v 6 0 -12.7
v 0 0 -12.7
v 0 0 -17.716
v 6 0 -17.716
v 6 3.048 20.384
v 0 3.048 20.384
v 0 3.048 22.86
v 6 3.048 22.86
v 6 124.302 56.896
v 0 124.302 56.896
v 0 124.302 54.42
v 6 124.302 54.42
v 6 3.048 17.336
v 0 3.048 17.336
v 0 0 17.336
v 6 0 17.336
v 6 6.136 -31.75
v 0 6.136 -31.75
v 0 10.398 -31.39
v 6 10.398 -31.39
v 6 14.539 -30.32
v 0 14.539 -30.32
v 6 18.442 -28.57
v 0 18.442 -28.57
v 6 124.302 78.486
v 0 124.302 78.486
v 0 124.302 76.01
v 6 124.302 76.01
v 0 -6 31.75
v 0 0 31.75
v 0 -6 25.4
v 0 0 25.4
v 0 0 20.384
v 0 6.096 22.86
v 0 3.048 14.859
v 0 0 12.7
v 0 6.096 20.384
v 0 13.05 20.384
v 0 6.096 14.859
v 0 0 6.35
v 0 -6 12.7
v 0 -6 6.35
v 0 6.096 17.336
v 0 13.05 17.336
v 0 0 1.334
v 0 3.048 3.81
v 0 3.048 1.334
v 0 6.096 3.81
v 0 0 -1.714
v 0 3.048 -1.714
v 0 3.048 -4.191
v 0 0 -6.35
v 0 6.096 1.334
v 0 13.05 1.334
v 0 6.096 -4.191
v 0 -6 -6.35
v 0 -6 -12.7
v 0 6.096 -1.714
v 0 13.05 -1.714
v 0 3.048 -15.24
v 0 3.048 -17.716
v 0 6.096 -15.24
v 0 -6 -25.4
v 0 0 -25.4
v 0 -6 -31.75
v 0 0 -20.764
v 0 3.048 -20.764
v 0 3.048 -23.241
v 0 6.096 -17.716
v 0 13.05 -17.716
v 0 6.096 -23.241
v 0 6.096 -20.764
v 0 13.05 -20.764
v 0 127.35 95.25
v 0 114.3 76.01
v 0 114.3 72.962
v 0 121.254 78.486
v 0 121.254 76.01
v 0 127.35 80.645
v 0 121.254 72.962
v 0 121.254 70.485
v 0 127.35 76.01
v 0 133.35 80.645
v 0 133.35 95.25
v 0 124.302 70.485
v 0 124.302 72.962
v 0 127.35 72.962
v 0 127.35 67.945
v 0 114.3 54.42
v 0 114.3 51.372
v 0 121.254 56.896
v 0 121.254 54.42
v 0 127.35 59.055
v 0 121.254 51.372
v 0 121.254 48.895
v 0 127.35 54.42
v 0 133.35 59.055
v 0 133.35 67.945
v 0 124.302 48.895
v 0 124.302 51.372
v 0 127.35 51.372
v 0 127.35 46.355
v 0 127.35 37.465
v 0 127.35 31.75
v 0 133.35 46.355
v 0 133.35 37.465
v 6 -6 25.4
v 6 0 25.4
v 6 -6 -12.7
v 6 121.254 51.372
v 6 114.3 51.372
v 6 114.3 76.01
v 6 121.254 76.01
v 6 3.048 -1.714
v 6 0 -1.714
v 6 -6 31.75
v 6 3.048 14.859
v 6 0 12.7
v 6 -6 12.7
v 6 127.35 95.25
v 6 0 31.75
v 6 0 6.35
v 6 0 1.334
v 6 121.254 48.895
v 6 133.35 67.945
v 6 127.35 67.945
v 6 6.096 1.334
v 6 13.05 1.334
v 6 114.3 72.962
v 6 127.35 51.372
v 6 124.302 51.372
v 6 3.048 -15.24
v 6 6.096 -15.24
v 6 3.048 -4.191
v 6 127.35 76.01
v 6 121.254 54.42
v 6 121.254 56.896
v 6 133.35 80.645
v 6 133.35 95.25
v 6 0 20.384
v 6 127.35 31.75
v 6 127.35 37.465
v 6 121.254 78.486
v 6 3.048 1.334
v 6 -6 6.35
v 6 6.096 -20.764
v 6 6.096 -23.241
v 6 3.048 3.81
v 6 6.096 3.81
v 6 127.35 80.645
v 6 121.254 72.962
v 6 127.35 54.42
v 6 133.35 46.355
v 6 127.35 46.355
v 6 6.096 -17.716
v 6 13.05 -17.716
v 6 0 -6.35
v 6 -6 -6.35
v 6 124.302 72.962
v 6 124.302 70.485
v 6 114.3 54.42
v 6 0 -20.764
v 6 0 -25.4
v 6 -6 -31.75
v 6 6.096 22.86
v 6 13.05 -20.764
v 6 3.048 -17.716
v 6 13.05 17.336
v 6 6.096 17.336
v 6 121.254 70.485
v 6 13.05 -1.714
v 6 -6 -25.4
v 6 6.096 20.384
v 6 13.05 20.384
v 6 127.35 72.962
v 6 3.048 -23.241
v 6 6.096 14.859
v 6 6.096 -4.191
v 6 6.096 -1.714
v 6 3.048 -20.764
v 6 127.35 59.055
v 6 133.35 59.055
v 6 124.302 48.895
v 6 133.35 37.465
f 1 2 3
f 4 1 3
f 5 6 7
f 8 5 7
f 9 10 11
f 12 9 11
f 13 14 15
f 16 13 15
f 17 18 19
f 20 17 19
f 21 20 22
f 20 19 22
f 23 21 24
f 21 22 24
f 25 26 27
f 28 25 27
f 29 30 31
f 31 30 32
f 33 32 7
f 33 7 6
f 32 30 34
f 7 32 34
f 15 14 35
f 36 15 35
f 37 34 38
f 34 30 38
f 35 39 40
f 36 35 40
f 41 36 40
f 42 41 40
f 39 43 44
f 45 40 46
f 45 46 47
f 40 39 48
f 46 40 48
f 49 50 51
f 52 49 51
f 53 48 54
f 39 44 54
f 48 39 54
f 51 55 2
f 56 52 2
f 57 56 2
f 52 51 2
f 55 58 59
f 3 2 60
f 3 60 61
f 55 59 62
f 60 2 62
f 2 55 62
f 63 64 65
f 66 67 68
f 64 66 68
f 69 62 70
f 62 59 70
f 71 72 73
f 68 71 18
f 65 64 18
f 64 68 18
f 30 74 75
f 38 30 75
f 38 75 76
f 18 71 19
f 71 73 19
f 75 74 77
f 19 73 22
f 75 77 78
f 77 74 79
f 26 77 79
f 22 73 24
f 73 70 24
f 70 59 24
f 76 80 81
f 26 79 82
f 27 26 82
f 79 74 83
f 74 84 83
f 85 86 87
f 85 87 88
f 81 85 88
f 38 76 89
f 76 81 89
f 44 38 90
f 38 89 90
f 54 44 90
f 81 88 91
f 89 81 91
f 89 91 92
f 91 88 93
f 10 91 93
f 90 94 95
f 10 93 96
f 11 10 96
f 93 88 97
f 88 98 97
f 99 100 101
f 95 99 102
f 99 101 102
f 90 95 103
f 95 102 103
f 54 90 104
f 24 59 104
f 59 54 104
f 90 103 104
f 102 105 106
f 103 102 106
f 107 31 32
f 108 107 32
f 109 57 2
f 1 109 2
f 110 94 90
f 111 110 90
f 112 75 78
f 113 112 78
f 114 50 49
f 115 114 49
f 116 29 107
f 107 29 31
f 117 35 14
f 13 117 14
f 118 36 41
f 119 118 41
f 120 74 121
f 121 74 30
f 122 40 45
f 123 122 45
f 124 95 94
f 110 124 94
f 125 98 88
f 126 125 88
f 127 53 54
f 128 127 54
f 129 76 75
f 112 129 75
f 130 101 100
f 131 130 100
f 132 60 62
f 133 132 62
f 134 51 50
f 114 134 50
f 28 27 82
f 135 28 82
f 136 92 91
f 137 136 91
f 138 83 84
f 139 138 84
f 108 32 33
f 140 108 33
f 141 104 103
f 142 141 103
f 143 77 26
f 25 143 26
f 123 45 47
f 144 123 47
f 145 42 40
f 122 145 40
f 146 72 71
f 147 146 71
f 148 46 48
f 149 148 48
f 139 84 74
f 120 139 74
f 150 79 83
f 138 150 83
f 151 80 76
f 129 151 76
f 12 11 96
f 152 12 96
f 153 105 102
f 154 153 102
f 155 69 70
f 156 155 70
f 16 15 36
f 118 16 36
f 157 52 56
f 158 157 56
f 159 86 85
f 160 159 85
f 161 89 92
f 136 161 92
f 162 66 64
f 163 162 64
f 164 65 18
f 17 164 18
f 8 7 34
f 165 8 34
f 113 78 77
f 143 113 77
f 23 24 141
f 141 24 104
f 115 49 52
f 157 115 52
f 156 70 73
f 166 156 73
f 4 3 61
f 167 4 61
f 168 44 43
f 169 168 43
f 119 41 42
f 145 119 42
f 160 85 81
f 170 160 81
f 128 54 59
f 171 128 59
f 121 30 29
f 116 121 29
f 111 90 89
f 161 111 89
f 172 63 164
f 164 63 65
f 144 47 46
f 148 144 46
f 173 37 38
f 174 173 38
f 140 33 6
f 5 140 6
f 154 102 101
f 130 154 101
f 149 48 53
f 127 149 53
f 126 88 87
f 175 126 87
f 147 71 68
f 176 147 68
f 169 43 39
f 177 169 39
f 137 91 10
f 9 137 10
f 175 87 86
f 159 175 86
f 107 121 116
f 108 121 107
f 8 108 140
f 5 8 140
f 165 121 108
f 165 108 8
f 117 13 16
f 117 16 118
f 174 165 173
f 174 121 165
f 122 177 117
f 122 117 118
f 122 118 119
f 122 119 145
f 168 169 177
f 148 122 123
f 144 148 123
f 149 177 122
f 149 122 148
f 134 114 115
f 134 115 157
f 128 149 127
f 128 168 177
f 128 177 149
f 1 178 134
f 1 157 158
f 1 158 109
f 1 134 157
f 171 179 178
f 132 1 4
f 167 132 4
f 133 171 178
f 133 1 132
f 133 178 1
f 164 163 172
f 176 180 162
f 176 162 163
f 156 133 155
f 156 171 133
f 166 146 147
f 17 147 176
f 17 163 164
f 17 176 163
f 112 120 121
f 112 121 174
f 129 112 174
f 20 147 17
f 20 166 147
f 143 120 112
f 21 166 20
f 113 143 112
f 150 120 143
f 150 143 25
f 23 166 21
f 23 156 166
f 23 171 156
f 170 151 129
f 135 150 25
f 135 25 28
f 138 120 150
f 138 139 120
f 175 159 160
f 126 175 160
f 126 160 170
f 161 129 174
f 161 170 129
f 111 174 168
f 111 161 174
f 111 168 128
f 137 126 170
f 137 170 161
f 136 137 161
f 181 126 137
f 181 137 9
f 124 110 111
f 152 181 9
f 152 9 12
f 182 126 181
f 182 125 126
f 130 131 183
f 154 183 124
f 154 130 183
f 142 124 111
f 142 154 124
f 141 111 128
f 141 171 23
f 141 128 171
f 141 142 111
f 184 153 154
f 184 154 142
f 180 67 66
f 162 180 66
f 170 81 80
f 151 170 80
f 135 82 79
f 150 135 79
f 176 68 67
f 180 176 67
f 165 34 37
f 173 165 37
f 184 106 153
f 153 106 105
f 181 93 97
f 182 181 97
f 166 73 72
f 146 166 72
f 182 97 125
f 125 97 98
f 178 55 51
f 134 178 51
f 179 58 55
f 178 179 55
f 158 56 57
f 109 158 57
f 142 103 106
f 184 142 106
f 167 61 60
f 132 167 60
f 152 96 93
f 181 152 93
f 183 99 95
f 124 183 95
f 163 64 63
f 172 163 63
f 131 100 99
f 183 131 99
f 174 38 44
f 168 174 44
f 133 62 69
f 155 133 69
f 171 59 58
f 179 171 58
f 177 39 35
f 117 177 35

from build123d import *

# Parameters (mm, degrees)
BOSS_EXTRUDE1_DEPTH = 6


with BuildPart() as part:
    # Sketch1 → Boss-Extrude1 (new body)
    with BuildSketch(Plane(origin=(0, 0, 0), x_dir=(0, 0, -1), z_dir=(1, 0, 0))):
        with BuildLine():
            Line((-95.25, 127.35), (-31.75, 0))
            Line((-31.75, 0), (-31.75, -6))
            Line((-31.75, -6), (-25.4, -6))
            Line((-25.4, -6), (-25.4, 0))
            Line((-25.4, 0), (-20.3835, 0))
            Line((-20.3835, 0), (-20.3835, 3.048))
            Line((-20.3835, 3.048), (-22.86, 3.048))
            Line((-22.86, 3.048), (-22.86, 6.096))
            Line((-22.86, 6.096), (-20.3835, 6.096))
            Line((-20.3835, 6.096), (-20.3835, 13.050000062))
            Line((-20.3835, 13.050000062), (-17.3355, 13.050000062))
            Line((-17.3355, 13.050000062), (-17.3355, 6.096))
            Line((-17.3355, 6.096), (-14.859, 6.096))
            Line((-14.859, 6.096), (-14.859, 3.048))
            Line((-14.859, 3.048), (-17.3355, 3.048))
            Line((-17.3355, 3.048), (-17.3355, 0))
            Line((-17.3355, 0), (-12.7, 0))
            Line((-12.7, 0), (-12.7, -6))
            Line((-12.7, -6), (-6.35, -6))
            Line((-6.35, -6), (-6.35, 0))
            Line((-6.35, 0), (-1.3335, 0))
            Line((-1.3335, 0), (-1.3335, 3.048))
            Line((-1.3335, 3.048), (-3.81, 3.048))
            Line((-3.81, 3.048), (-3.81, 6.096))
            Line((-3.81, 6.096), (-1.3335, 6.096))
            Line((-1.3335, 6.096), (-1.3335, 13.050000062))
            Line((-1.3335, 13.050000062), (1.7145, 13.050000062))
            Line((1.7145, 13.050000062), (1.7145, 6.096))
            Line((1.7145, 6.096), (4.191, 6.096))
            Line((4.191, 6.096), (4.191, 3.048))
            Line((4.191, 3.048), (1.7145, 3.048))
            Line((1.7145, 3.048), (1.7145, 0))
            Line((1.7145, 0), (6.35, 0))
            Line((6.35, 0), (6.35, -6))
            Line((6.35, -6), (12.7, -6))
            Line((12.7, -6), (12.7, 0))
            Line((12.7, 0), (17.7165, 0))
            Line((17.7165, 0), (17.7165, 3.048))
            Line((17.7165, 3.048), (15.24, 3.048))
            Line((15.24, 3.048), (15.24, 6.096))
            Line((15.24, 6.096), (17.7165, 6.096))
            Line((17.7165, 6.096), (17.7165, 13.050000062))
            Line((17.7165, 13.050000062), (20.7645, 13.050000062))
            Line((20.7645, 13.050000062), (20.7645, 6.096))
            Line((20.7645, 6.096), (23.241, 6.096))
            Line((23.241, 6.096), (23.241, 3.048))
            Line((23.241, 3.048), (20.7645, 3.048))
            Line((20.7645, 3.048), (20.7645, 0))
            Line((20.7645, 0), (25.4, 0))
            Line((25.4, 0), (25.4, -6))
            Line((25.4, -6), (31.75, -6))
            Line((31.75, -6), (31.75, 0))
            Line((31.75, 0), (31.75, 6.135772776))
            ThreePointArc((31.75, 6.135772776), (30.94204324, 12.491196387), (28.569574073, 18.442296576))
            Line((28.569574073, 18.442296576), (-31.75, 127.35))
            Line((-31.75, 127.35), (-37.465, 127.35))
            Line((-37.465, 127.35), (-37.465, 133.35))
            Line((-37.465, 133.35), (-46.355, 133.35))
            Line((-46.355, 133.35), (-46.355, 127.35))
            Line((-46.355, 127.35), (-51.3715, 127.35))
            Line((-51.3715, 127.35), (-51.3715, 124.302))
            Line((-51.3715, 124.302), (-48.895, 124.302))
            Line((-48.895, 124.302), (-48.895, 121.254))
            Line((-48.895, 121.254), (-51.3715, 121.254))
            Line((-51.3715, 121.254), (-51.3715, 114.299999938))
            Line((-51.3715, 114.299999938), (-54.4195, 114.299999938))
            Line((-54.4195, 114.299999938), (-54.4195, 121.254))
            Line((-54.4195, 121.254), (-56.896, 121.254))
            Line((-56.896, 121.254), (-56.896, 124.302))
            Line((-56.896, 124.302), (-54.4195, 124.302))
            Line((-54.4195, 124.302), (-54.4195, 127.35))
            Line((-54.4195, 127.35), (-59.055, 127.35))
            Line((-59.055, 127.35), (-59.055, 133.35))
            Line((-59.055, 133.35), (-67.945, 133.35))
            Line((-67.945, 133.35), (-67.945, 127.35))
            Line((-67.945, 127.35), (-72.9615, 127.35))
            Line((-72.9615, 127.35), (-72.9615, 124.302))
            Line((-72.9615, 124.302), (-70.485, 124.302))
            Line((-70.485, 124.302), (-70.485, 121.254))
            Line((-70.485, 121.254), (-72.9615, 121.254))
            Line((-72.9615, 121.254), (-72.9615, 114.299999938))
            Line((-72.9615, 114.299999938), (-76.0095, 114.299999938))
            Line((-76.0095, 114.299999938), (-76.0095, 121.254))
            Line((-76.0095, 121.254), (-78.486, 121.254))
            Line((-78.486, 121.254), (-78.486, 124.302))
            Line((-78.486, 124.302), (-76.0095, 124.302))
            Line((-76.0095, 124.302), (-76.0095, 127.35))
            Line((-76.0095, 127.35), (-80.645, 127.35))
            Line((-80.645, 127.35), (-80.645, 133.35))
            Line((-80.645, 133.35), (-95.25, 133.35))
            Line((-95.25, 133.35), (-95.25, 127.35))
        make_face()
    extrude(amount=BOSS_EXTRUDE1_DEPTH)


solid = part.part
